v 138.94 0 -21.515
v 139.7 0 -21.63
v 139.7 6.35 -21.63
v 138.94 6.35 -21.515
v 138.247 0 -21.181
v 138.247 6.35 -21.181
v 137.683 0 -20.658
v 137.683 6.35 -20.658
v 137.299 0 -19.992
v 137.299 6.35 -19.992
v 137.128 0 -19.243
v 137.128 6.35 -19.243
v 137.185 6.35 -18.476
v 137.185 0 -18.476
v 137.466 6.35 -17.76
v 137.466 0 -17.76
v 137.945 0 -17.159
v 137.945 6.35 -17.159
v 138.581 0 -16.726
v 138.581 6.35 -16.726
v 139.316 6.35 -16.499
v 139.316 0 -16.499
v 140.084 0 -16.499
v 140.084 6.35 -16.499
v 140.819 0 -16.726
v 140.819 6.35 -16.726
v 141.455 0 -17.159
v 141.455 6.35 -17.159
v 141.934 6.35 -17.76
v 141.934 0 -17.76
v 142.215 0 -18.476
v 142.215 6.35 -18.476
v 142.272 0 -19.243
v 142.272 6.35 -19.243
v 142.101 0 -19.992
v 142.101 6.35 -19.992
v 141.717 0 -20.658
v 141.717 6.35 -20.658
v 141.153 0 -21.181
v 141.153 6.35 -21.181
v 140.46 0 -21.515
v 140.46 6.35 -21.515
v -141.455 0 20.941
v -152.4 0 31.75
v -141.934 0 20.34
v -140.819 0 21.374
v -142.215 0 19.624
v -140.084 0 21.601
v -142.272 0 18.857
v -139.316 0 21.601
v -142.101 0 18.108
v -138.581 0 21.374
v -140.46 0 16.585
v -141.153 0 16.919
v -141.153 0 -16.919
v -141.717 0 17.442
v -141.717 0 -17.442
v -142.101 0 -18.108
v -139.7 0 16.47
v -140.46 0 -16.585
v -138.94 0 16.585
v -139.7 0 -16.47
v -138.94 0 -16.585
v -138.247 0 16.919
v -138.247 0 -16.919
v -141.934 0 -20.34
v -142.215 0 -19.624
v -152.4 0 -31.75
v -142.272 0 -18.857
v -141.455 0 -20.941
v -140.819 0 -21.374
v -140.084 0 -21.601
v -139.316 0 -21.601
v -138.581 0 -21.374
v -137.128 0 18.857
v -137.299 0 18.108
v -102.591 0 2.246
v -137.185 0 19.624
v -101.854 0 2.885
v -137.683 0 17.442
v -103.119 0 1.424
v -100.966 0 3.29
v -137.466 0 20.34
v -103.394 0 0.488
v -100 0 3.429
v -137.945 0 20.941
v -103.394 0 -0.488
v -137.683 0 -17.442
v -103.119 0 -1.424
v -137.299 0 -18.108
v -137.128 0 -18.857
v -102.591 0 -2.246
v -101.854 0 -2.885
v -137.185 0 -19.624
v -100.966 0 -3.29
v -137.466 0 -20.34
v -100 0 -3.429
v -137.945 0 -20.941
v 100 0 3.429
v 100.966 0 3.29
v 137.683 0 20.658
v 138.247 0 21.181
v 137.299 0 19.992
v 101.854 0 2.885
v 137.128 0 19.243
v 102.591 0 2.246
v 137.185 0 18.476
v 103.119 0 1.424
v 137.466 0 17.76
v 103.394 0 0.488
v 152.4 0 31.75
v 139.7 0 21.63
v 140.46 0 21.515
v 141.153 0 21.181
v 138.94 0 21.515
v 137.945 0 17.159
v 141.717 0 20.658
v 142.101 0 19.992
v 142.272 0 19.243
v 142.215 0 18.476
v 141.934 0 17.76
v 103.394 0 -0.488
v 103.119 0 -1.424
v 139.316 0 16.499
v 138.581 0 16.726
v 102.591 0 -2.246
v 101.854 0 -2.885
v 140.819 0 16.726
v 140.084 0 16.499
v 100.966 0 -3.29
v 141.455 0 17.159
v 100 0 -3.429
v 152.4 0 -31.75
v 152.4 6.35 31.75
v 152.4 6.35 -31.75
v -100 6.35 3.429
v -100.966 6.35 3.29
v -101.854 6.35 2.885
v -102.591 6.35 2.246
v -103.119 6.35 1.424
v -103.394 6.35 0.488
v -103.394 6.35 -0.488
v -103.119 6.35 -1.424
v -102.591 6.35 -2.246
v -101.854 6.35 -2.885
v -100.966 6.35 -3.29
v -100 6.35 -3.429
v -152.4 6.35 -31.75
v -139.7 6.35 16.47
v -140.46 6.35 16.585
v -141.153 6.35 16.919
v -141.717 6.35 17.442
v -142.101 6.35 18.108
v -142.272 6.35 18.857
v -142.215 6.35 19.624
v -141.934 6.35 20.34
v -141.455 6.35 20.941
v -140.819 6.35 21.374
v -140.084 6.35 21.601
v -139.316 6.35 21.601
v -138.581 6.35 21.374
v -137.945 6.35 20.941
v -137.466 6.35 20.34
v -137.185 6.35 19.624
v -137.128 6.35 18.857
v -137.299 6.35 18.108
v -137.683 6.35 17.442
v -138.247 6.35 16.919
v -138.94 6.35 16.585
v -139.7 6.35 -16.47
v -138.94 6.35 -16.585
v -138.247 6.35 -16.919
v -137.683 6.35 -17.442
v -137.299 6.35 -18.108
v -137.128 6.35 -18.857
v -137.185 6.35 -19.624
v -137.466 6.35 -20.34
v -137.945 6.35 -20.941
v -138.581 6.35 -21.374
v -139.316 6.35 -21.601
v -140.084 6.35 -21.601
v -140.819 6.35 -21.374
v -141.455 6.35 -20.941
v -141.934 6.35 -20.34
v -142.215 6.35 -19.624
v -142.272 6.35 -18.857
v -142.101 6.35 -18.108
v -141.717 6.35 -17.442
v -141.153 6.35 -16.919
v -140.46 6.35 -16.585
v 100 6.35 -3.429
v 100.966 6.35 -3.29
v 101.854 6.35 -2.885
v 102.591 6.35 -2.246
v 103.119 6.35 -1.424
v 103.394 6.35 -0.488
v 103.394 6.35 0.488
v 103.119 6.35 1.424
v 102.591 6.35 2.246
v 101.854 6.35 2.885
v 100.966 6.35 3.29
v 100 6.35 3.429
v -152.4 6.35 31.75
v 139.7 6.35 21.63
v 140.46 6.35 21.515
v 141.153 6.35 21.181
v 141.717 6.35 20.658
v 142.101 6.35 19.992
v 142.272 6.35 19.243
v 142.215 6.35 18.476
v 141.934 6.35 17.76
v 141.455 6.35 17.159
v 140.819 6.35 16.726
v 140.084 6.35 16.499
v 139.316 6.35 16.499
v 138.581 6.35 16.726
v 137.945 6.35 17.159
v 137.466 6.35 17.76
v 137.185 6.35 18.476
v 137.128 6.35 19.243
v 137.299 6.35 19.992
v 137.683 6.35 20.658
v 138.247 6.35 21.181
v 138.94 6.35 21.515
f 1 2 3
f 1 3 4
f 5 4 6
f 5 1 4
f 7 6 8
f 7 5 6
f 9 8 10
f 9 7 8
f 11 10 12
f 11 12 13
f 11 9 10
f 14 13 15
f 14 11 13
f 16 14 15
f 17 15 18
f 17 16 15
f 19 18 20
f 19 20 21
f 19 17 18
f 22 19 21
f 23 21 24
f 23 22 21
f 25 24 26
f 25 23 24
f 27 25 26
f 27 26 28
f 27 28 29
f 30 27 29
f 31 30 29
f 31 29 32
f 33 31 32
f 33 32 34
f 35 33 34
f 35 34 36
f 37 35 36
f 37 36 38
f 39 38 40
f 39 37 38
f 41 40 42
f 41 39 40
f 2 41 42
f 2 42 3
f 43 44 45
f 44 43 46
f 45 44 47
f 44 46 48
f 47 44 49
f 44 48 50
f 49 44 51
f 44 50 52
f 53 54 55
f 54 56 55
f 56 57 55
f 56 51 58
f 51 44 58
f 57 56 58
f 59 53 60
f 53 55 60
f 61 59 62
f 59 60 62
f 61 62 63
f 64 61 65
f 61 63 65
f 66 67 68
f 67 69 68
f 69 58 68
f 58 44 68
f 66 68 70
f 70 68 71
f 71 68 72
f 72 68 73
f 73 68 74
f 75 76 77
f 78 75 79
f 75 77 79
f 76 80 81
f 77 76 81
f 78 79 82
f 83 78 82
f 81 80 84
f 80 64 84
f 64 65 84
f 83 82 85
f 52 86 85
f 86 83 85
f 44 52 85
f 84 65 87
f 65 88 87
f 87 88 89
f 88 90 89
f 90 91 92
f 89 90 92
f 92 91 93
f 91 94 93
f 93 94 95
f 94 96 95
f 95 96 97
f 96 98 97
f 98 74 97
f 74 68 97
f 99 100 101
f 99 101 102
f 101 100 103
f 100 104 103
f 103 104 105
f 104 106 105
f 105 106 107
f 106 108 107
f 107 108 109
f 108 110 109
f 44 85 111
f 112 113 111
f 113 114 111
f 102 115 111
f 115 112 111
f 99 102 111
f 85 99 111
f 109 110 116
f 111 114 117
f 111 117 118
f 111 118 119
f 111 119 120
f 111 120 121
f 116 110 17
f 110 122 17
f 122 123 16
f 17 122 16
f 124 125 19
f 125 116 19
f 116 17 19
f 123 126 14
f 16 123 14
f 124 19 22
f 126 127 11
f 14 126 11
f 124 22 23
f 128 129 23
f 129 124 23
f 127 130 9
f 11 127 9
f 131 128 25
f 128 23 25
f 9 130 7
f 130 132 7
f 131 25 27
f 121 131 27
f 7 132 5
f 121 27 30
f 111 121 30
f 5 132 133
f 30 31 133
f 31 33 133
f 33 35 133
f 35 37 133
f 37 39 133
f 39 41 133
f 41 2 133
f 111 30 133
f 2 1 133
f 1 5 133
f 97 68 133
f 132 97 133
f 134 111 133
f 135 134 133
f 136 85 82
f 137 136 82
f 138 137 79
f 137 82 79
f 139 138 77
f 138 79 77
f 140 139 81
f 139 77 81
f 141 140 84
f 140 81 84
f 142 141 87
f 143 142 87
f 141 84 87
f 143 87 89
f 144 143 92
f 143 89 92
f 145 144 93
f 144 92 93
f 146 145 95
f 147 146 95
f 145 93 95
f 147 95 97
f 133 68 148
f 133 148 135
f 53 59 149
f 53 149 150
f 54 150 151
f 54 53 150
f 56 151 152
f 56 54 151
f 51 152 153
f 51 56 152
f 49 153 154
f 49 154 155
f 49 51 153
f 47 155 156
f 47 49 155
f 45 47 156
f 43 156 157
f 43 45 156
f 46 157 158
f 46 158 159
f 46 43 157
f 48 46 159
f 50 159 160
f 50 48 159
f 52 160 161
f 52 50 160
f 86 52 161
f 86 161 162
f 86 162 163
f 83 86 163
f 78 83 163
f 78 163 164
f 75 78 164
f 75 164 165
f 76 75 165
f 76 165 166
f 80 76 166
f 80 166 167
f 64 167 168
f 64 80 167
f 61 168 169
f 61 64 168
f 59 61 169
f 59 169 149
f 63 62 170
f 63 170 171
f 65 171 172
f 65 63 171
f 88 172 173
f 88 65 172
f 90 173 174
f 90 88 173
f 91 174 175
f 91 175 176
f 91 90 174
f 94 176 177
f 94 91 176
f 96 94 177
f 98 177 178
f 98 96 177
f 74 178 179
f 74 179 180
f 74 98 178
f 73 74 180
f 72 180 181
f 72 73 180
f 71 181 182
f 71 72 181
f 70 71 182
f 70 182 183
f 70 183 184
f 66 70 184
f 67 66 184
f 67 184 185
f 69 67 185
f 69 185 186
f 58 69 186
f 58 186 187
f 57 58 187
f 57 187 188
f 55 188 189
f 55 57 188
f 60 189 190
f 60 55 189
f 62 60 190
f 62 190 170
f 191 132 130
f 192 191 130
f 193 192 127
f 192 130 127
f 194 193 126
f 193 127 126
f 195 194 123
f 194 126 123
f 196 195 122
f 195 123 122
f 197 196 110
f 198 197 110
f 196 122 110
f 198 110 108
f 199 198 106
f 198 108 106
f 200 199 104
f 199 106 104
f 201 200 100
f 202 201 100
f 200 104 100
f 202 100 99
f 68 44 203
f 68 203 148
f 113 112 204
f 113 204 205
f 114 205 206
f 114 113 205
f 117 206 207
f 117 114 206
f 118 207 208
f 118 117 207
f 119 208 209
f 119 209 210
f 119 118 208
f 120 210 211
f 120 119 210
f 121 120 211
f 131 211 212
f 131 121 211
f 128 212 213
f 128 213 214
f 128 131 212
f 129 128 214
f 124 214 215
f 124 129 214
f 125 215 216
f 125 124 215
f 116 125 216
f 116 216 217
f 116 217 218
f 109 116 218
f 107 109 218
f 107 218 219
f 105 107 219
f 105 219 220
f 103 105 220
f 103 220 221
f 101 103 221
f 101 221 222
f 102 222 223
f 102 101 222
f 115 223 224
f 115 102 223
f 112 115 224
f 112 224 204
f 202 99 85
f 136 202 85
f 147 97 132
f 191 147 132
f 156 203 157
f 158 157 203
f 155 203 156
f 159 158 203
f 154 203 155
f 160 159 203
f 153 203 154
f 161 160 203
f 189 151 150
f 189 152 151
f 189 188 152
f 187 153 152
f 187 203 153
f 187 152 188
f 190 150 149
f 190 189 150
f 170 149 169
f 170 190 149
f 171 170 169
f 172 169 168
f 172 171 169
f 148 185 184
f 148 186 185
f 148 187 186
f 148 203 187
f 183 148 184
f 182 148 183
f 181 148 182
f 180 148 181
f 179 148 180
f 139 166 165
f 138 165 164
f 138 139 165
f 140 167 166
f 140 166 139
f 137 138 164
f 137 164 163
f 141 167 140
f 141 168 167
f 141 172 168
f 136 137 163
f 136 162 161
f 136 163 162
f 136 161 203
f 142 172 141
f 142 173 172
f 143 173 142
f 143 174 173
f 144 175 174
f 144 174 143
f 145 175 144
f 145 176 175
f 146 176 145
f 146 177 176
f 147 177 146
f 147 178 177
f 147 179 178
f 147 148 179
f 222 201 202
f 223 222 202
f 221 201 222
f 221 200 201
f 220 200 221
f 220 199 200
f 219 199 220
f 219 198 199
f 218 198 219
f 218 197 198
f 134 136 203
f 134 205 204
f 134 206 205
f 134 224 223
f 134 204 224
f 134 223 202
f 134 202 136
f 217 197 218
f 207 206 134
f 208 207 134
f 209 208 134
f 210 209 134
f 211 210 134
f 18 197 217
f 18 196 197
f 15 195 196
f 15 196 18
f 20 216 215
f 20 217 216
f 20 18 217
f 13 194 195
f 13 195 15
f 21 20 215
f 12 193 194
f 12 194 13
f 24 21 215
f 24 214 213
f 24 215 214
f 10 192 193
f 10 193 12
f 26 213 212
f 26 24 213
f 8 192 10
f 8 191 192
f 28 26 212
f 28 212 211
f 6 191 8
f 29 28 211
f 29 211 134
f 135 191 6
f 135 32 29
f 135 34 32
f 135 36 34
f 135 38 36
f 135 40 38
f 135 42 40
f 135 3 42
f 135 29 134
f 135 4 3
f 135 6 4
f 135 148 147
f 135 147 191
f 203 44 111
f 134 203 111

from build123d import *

# Parameters (mm, degrees)
SKETCH1_W           = 304.8
SKETCH1_H           = 63.5
SKETCH1_R           = 2.5796875
BOSS_EXTRUDE1_DEPTH = 6.35


with BuildPart() as part:
    # Sketch1 → Boss-Extrude1 (new body)
    with BuildSketch(Plane(origin=(0, 0, 0), x_dir=(1, 0, 0), z_dir=(0, 1, 0))):
        Rectangle(SKETCH1_W, SKETCH1_H)
        with Locations(Location((-139.7, 19.05, 0), (0, 0, 270))):
            Circle(SKETCH1_R, mode=Mode.SUBTRACT)
        with Locations(Location((139.7, 19.05, 0), (0, 0, 90))):
            Circle(SKETCH1_R, mode=Mode.SUBTRACT)
        with Locations(Location((139.7, -19.05, 0), (0, 0, 270))):
            Circle(SKETCH1_R, mode=Mode.SUBTRACT)
        with Locations(Location((-139.7, -19.05, 0), (0, 0, 90))):
            Circle(SKETCH1_R, mode=Mode.SUBTRACT)
        with BuildLine():
            Line((-100, 3.429), (100, 3.429))
            ThreePointArc((100, 3.429), (103.429, 0), (100, -3.429))
            Line((100, -3.429), (-100, -3.429))
            ThreePointArc((-100, -3.429), (-103.429, 0), (-100, 3.429))
        make_face(mode=Mode.SUBTRACT)
    extrude(amount=BOSS_EXTRUDE1_DEPTH)


solid = part.part
